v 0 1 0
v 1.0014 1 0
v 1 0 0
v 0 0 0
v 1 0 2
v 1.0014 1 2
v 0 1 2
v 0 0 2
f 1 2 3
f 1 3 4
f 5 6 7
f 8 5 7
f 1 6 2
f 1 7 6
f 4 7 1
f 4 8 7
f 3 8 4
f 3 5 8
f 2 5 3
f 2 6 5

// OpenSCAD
// This crashes OpenSCAD including 2011.06 in PolyReducer due to two vertices of 
// a triangle evaluating to the same index
linear_extrude(height=2) 
  polygon(points=[[0, 0],
		  [1, 0],
		  [1.0014, 1],
		  [1, 1],
		  [0, 1]], 
           paths=[[0,1,2,3,4]]);
